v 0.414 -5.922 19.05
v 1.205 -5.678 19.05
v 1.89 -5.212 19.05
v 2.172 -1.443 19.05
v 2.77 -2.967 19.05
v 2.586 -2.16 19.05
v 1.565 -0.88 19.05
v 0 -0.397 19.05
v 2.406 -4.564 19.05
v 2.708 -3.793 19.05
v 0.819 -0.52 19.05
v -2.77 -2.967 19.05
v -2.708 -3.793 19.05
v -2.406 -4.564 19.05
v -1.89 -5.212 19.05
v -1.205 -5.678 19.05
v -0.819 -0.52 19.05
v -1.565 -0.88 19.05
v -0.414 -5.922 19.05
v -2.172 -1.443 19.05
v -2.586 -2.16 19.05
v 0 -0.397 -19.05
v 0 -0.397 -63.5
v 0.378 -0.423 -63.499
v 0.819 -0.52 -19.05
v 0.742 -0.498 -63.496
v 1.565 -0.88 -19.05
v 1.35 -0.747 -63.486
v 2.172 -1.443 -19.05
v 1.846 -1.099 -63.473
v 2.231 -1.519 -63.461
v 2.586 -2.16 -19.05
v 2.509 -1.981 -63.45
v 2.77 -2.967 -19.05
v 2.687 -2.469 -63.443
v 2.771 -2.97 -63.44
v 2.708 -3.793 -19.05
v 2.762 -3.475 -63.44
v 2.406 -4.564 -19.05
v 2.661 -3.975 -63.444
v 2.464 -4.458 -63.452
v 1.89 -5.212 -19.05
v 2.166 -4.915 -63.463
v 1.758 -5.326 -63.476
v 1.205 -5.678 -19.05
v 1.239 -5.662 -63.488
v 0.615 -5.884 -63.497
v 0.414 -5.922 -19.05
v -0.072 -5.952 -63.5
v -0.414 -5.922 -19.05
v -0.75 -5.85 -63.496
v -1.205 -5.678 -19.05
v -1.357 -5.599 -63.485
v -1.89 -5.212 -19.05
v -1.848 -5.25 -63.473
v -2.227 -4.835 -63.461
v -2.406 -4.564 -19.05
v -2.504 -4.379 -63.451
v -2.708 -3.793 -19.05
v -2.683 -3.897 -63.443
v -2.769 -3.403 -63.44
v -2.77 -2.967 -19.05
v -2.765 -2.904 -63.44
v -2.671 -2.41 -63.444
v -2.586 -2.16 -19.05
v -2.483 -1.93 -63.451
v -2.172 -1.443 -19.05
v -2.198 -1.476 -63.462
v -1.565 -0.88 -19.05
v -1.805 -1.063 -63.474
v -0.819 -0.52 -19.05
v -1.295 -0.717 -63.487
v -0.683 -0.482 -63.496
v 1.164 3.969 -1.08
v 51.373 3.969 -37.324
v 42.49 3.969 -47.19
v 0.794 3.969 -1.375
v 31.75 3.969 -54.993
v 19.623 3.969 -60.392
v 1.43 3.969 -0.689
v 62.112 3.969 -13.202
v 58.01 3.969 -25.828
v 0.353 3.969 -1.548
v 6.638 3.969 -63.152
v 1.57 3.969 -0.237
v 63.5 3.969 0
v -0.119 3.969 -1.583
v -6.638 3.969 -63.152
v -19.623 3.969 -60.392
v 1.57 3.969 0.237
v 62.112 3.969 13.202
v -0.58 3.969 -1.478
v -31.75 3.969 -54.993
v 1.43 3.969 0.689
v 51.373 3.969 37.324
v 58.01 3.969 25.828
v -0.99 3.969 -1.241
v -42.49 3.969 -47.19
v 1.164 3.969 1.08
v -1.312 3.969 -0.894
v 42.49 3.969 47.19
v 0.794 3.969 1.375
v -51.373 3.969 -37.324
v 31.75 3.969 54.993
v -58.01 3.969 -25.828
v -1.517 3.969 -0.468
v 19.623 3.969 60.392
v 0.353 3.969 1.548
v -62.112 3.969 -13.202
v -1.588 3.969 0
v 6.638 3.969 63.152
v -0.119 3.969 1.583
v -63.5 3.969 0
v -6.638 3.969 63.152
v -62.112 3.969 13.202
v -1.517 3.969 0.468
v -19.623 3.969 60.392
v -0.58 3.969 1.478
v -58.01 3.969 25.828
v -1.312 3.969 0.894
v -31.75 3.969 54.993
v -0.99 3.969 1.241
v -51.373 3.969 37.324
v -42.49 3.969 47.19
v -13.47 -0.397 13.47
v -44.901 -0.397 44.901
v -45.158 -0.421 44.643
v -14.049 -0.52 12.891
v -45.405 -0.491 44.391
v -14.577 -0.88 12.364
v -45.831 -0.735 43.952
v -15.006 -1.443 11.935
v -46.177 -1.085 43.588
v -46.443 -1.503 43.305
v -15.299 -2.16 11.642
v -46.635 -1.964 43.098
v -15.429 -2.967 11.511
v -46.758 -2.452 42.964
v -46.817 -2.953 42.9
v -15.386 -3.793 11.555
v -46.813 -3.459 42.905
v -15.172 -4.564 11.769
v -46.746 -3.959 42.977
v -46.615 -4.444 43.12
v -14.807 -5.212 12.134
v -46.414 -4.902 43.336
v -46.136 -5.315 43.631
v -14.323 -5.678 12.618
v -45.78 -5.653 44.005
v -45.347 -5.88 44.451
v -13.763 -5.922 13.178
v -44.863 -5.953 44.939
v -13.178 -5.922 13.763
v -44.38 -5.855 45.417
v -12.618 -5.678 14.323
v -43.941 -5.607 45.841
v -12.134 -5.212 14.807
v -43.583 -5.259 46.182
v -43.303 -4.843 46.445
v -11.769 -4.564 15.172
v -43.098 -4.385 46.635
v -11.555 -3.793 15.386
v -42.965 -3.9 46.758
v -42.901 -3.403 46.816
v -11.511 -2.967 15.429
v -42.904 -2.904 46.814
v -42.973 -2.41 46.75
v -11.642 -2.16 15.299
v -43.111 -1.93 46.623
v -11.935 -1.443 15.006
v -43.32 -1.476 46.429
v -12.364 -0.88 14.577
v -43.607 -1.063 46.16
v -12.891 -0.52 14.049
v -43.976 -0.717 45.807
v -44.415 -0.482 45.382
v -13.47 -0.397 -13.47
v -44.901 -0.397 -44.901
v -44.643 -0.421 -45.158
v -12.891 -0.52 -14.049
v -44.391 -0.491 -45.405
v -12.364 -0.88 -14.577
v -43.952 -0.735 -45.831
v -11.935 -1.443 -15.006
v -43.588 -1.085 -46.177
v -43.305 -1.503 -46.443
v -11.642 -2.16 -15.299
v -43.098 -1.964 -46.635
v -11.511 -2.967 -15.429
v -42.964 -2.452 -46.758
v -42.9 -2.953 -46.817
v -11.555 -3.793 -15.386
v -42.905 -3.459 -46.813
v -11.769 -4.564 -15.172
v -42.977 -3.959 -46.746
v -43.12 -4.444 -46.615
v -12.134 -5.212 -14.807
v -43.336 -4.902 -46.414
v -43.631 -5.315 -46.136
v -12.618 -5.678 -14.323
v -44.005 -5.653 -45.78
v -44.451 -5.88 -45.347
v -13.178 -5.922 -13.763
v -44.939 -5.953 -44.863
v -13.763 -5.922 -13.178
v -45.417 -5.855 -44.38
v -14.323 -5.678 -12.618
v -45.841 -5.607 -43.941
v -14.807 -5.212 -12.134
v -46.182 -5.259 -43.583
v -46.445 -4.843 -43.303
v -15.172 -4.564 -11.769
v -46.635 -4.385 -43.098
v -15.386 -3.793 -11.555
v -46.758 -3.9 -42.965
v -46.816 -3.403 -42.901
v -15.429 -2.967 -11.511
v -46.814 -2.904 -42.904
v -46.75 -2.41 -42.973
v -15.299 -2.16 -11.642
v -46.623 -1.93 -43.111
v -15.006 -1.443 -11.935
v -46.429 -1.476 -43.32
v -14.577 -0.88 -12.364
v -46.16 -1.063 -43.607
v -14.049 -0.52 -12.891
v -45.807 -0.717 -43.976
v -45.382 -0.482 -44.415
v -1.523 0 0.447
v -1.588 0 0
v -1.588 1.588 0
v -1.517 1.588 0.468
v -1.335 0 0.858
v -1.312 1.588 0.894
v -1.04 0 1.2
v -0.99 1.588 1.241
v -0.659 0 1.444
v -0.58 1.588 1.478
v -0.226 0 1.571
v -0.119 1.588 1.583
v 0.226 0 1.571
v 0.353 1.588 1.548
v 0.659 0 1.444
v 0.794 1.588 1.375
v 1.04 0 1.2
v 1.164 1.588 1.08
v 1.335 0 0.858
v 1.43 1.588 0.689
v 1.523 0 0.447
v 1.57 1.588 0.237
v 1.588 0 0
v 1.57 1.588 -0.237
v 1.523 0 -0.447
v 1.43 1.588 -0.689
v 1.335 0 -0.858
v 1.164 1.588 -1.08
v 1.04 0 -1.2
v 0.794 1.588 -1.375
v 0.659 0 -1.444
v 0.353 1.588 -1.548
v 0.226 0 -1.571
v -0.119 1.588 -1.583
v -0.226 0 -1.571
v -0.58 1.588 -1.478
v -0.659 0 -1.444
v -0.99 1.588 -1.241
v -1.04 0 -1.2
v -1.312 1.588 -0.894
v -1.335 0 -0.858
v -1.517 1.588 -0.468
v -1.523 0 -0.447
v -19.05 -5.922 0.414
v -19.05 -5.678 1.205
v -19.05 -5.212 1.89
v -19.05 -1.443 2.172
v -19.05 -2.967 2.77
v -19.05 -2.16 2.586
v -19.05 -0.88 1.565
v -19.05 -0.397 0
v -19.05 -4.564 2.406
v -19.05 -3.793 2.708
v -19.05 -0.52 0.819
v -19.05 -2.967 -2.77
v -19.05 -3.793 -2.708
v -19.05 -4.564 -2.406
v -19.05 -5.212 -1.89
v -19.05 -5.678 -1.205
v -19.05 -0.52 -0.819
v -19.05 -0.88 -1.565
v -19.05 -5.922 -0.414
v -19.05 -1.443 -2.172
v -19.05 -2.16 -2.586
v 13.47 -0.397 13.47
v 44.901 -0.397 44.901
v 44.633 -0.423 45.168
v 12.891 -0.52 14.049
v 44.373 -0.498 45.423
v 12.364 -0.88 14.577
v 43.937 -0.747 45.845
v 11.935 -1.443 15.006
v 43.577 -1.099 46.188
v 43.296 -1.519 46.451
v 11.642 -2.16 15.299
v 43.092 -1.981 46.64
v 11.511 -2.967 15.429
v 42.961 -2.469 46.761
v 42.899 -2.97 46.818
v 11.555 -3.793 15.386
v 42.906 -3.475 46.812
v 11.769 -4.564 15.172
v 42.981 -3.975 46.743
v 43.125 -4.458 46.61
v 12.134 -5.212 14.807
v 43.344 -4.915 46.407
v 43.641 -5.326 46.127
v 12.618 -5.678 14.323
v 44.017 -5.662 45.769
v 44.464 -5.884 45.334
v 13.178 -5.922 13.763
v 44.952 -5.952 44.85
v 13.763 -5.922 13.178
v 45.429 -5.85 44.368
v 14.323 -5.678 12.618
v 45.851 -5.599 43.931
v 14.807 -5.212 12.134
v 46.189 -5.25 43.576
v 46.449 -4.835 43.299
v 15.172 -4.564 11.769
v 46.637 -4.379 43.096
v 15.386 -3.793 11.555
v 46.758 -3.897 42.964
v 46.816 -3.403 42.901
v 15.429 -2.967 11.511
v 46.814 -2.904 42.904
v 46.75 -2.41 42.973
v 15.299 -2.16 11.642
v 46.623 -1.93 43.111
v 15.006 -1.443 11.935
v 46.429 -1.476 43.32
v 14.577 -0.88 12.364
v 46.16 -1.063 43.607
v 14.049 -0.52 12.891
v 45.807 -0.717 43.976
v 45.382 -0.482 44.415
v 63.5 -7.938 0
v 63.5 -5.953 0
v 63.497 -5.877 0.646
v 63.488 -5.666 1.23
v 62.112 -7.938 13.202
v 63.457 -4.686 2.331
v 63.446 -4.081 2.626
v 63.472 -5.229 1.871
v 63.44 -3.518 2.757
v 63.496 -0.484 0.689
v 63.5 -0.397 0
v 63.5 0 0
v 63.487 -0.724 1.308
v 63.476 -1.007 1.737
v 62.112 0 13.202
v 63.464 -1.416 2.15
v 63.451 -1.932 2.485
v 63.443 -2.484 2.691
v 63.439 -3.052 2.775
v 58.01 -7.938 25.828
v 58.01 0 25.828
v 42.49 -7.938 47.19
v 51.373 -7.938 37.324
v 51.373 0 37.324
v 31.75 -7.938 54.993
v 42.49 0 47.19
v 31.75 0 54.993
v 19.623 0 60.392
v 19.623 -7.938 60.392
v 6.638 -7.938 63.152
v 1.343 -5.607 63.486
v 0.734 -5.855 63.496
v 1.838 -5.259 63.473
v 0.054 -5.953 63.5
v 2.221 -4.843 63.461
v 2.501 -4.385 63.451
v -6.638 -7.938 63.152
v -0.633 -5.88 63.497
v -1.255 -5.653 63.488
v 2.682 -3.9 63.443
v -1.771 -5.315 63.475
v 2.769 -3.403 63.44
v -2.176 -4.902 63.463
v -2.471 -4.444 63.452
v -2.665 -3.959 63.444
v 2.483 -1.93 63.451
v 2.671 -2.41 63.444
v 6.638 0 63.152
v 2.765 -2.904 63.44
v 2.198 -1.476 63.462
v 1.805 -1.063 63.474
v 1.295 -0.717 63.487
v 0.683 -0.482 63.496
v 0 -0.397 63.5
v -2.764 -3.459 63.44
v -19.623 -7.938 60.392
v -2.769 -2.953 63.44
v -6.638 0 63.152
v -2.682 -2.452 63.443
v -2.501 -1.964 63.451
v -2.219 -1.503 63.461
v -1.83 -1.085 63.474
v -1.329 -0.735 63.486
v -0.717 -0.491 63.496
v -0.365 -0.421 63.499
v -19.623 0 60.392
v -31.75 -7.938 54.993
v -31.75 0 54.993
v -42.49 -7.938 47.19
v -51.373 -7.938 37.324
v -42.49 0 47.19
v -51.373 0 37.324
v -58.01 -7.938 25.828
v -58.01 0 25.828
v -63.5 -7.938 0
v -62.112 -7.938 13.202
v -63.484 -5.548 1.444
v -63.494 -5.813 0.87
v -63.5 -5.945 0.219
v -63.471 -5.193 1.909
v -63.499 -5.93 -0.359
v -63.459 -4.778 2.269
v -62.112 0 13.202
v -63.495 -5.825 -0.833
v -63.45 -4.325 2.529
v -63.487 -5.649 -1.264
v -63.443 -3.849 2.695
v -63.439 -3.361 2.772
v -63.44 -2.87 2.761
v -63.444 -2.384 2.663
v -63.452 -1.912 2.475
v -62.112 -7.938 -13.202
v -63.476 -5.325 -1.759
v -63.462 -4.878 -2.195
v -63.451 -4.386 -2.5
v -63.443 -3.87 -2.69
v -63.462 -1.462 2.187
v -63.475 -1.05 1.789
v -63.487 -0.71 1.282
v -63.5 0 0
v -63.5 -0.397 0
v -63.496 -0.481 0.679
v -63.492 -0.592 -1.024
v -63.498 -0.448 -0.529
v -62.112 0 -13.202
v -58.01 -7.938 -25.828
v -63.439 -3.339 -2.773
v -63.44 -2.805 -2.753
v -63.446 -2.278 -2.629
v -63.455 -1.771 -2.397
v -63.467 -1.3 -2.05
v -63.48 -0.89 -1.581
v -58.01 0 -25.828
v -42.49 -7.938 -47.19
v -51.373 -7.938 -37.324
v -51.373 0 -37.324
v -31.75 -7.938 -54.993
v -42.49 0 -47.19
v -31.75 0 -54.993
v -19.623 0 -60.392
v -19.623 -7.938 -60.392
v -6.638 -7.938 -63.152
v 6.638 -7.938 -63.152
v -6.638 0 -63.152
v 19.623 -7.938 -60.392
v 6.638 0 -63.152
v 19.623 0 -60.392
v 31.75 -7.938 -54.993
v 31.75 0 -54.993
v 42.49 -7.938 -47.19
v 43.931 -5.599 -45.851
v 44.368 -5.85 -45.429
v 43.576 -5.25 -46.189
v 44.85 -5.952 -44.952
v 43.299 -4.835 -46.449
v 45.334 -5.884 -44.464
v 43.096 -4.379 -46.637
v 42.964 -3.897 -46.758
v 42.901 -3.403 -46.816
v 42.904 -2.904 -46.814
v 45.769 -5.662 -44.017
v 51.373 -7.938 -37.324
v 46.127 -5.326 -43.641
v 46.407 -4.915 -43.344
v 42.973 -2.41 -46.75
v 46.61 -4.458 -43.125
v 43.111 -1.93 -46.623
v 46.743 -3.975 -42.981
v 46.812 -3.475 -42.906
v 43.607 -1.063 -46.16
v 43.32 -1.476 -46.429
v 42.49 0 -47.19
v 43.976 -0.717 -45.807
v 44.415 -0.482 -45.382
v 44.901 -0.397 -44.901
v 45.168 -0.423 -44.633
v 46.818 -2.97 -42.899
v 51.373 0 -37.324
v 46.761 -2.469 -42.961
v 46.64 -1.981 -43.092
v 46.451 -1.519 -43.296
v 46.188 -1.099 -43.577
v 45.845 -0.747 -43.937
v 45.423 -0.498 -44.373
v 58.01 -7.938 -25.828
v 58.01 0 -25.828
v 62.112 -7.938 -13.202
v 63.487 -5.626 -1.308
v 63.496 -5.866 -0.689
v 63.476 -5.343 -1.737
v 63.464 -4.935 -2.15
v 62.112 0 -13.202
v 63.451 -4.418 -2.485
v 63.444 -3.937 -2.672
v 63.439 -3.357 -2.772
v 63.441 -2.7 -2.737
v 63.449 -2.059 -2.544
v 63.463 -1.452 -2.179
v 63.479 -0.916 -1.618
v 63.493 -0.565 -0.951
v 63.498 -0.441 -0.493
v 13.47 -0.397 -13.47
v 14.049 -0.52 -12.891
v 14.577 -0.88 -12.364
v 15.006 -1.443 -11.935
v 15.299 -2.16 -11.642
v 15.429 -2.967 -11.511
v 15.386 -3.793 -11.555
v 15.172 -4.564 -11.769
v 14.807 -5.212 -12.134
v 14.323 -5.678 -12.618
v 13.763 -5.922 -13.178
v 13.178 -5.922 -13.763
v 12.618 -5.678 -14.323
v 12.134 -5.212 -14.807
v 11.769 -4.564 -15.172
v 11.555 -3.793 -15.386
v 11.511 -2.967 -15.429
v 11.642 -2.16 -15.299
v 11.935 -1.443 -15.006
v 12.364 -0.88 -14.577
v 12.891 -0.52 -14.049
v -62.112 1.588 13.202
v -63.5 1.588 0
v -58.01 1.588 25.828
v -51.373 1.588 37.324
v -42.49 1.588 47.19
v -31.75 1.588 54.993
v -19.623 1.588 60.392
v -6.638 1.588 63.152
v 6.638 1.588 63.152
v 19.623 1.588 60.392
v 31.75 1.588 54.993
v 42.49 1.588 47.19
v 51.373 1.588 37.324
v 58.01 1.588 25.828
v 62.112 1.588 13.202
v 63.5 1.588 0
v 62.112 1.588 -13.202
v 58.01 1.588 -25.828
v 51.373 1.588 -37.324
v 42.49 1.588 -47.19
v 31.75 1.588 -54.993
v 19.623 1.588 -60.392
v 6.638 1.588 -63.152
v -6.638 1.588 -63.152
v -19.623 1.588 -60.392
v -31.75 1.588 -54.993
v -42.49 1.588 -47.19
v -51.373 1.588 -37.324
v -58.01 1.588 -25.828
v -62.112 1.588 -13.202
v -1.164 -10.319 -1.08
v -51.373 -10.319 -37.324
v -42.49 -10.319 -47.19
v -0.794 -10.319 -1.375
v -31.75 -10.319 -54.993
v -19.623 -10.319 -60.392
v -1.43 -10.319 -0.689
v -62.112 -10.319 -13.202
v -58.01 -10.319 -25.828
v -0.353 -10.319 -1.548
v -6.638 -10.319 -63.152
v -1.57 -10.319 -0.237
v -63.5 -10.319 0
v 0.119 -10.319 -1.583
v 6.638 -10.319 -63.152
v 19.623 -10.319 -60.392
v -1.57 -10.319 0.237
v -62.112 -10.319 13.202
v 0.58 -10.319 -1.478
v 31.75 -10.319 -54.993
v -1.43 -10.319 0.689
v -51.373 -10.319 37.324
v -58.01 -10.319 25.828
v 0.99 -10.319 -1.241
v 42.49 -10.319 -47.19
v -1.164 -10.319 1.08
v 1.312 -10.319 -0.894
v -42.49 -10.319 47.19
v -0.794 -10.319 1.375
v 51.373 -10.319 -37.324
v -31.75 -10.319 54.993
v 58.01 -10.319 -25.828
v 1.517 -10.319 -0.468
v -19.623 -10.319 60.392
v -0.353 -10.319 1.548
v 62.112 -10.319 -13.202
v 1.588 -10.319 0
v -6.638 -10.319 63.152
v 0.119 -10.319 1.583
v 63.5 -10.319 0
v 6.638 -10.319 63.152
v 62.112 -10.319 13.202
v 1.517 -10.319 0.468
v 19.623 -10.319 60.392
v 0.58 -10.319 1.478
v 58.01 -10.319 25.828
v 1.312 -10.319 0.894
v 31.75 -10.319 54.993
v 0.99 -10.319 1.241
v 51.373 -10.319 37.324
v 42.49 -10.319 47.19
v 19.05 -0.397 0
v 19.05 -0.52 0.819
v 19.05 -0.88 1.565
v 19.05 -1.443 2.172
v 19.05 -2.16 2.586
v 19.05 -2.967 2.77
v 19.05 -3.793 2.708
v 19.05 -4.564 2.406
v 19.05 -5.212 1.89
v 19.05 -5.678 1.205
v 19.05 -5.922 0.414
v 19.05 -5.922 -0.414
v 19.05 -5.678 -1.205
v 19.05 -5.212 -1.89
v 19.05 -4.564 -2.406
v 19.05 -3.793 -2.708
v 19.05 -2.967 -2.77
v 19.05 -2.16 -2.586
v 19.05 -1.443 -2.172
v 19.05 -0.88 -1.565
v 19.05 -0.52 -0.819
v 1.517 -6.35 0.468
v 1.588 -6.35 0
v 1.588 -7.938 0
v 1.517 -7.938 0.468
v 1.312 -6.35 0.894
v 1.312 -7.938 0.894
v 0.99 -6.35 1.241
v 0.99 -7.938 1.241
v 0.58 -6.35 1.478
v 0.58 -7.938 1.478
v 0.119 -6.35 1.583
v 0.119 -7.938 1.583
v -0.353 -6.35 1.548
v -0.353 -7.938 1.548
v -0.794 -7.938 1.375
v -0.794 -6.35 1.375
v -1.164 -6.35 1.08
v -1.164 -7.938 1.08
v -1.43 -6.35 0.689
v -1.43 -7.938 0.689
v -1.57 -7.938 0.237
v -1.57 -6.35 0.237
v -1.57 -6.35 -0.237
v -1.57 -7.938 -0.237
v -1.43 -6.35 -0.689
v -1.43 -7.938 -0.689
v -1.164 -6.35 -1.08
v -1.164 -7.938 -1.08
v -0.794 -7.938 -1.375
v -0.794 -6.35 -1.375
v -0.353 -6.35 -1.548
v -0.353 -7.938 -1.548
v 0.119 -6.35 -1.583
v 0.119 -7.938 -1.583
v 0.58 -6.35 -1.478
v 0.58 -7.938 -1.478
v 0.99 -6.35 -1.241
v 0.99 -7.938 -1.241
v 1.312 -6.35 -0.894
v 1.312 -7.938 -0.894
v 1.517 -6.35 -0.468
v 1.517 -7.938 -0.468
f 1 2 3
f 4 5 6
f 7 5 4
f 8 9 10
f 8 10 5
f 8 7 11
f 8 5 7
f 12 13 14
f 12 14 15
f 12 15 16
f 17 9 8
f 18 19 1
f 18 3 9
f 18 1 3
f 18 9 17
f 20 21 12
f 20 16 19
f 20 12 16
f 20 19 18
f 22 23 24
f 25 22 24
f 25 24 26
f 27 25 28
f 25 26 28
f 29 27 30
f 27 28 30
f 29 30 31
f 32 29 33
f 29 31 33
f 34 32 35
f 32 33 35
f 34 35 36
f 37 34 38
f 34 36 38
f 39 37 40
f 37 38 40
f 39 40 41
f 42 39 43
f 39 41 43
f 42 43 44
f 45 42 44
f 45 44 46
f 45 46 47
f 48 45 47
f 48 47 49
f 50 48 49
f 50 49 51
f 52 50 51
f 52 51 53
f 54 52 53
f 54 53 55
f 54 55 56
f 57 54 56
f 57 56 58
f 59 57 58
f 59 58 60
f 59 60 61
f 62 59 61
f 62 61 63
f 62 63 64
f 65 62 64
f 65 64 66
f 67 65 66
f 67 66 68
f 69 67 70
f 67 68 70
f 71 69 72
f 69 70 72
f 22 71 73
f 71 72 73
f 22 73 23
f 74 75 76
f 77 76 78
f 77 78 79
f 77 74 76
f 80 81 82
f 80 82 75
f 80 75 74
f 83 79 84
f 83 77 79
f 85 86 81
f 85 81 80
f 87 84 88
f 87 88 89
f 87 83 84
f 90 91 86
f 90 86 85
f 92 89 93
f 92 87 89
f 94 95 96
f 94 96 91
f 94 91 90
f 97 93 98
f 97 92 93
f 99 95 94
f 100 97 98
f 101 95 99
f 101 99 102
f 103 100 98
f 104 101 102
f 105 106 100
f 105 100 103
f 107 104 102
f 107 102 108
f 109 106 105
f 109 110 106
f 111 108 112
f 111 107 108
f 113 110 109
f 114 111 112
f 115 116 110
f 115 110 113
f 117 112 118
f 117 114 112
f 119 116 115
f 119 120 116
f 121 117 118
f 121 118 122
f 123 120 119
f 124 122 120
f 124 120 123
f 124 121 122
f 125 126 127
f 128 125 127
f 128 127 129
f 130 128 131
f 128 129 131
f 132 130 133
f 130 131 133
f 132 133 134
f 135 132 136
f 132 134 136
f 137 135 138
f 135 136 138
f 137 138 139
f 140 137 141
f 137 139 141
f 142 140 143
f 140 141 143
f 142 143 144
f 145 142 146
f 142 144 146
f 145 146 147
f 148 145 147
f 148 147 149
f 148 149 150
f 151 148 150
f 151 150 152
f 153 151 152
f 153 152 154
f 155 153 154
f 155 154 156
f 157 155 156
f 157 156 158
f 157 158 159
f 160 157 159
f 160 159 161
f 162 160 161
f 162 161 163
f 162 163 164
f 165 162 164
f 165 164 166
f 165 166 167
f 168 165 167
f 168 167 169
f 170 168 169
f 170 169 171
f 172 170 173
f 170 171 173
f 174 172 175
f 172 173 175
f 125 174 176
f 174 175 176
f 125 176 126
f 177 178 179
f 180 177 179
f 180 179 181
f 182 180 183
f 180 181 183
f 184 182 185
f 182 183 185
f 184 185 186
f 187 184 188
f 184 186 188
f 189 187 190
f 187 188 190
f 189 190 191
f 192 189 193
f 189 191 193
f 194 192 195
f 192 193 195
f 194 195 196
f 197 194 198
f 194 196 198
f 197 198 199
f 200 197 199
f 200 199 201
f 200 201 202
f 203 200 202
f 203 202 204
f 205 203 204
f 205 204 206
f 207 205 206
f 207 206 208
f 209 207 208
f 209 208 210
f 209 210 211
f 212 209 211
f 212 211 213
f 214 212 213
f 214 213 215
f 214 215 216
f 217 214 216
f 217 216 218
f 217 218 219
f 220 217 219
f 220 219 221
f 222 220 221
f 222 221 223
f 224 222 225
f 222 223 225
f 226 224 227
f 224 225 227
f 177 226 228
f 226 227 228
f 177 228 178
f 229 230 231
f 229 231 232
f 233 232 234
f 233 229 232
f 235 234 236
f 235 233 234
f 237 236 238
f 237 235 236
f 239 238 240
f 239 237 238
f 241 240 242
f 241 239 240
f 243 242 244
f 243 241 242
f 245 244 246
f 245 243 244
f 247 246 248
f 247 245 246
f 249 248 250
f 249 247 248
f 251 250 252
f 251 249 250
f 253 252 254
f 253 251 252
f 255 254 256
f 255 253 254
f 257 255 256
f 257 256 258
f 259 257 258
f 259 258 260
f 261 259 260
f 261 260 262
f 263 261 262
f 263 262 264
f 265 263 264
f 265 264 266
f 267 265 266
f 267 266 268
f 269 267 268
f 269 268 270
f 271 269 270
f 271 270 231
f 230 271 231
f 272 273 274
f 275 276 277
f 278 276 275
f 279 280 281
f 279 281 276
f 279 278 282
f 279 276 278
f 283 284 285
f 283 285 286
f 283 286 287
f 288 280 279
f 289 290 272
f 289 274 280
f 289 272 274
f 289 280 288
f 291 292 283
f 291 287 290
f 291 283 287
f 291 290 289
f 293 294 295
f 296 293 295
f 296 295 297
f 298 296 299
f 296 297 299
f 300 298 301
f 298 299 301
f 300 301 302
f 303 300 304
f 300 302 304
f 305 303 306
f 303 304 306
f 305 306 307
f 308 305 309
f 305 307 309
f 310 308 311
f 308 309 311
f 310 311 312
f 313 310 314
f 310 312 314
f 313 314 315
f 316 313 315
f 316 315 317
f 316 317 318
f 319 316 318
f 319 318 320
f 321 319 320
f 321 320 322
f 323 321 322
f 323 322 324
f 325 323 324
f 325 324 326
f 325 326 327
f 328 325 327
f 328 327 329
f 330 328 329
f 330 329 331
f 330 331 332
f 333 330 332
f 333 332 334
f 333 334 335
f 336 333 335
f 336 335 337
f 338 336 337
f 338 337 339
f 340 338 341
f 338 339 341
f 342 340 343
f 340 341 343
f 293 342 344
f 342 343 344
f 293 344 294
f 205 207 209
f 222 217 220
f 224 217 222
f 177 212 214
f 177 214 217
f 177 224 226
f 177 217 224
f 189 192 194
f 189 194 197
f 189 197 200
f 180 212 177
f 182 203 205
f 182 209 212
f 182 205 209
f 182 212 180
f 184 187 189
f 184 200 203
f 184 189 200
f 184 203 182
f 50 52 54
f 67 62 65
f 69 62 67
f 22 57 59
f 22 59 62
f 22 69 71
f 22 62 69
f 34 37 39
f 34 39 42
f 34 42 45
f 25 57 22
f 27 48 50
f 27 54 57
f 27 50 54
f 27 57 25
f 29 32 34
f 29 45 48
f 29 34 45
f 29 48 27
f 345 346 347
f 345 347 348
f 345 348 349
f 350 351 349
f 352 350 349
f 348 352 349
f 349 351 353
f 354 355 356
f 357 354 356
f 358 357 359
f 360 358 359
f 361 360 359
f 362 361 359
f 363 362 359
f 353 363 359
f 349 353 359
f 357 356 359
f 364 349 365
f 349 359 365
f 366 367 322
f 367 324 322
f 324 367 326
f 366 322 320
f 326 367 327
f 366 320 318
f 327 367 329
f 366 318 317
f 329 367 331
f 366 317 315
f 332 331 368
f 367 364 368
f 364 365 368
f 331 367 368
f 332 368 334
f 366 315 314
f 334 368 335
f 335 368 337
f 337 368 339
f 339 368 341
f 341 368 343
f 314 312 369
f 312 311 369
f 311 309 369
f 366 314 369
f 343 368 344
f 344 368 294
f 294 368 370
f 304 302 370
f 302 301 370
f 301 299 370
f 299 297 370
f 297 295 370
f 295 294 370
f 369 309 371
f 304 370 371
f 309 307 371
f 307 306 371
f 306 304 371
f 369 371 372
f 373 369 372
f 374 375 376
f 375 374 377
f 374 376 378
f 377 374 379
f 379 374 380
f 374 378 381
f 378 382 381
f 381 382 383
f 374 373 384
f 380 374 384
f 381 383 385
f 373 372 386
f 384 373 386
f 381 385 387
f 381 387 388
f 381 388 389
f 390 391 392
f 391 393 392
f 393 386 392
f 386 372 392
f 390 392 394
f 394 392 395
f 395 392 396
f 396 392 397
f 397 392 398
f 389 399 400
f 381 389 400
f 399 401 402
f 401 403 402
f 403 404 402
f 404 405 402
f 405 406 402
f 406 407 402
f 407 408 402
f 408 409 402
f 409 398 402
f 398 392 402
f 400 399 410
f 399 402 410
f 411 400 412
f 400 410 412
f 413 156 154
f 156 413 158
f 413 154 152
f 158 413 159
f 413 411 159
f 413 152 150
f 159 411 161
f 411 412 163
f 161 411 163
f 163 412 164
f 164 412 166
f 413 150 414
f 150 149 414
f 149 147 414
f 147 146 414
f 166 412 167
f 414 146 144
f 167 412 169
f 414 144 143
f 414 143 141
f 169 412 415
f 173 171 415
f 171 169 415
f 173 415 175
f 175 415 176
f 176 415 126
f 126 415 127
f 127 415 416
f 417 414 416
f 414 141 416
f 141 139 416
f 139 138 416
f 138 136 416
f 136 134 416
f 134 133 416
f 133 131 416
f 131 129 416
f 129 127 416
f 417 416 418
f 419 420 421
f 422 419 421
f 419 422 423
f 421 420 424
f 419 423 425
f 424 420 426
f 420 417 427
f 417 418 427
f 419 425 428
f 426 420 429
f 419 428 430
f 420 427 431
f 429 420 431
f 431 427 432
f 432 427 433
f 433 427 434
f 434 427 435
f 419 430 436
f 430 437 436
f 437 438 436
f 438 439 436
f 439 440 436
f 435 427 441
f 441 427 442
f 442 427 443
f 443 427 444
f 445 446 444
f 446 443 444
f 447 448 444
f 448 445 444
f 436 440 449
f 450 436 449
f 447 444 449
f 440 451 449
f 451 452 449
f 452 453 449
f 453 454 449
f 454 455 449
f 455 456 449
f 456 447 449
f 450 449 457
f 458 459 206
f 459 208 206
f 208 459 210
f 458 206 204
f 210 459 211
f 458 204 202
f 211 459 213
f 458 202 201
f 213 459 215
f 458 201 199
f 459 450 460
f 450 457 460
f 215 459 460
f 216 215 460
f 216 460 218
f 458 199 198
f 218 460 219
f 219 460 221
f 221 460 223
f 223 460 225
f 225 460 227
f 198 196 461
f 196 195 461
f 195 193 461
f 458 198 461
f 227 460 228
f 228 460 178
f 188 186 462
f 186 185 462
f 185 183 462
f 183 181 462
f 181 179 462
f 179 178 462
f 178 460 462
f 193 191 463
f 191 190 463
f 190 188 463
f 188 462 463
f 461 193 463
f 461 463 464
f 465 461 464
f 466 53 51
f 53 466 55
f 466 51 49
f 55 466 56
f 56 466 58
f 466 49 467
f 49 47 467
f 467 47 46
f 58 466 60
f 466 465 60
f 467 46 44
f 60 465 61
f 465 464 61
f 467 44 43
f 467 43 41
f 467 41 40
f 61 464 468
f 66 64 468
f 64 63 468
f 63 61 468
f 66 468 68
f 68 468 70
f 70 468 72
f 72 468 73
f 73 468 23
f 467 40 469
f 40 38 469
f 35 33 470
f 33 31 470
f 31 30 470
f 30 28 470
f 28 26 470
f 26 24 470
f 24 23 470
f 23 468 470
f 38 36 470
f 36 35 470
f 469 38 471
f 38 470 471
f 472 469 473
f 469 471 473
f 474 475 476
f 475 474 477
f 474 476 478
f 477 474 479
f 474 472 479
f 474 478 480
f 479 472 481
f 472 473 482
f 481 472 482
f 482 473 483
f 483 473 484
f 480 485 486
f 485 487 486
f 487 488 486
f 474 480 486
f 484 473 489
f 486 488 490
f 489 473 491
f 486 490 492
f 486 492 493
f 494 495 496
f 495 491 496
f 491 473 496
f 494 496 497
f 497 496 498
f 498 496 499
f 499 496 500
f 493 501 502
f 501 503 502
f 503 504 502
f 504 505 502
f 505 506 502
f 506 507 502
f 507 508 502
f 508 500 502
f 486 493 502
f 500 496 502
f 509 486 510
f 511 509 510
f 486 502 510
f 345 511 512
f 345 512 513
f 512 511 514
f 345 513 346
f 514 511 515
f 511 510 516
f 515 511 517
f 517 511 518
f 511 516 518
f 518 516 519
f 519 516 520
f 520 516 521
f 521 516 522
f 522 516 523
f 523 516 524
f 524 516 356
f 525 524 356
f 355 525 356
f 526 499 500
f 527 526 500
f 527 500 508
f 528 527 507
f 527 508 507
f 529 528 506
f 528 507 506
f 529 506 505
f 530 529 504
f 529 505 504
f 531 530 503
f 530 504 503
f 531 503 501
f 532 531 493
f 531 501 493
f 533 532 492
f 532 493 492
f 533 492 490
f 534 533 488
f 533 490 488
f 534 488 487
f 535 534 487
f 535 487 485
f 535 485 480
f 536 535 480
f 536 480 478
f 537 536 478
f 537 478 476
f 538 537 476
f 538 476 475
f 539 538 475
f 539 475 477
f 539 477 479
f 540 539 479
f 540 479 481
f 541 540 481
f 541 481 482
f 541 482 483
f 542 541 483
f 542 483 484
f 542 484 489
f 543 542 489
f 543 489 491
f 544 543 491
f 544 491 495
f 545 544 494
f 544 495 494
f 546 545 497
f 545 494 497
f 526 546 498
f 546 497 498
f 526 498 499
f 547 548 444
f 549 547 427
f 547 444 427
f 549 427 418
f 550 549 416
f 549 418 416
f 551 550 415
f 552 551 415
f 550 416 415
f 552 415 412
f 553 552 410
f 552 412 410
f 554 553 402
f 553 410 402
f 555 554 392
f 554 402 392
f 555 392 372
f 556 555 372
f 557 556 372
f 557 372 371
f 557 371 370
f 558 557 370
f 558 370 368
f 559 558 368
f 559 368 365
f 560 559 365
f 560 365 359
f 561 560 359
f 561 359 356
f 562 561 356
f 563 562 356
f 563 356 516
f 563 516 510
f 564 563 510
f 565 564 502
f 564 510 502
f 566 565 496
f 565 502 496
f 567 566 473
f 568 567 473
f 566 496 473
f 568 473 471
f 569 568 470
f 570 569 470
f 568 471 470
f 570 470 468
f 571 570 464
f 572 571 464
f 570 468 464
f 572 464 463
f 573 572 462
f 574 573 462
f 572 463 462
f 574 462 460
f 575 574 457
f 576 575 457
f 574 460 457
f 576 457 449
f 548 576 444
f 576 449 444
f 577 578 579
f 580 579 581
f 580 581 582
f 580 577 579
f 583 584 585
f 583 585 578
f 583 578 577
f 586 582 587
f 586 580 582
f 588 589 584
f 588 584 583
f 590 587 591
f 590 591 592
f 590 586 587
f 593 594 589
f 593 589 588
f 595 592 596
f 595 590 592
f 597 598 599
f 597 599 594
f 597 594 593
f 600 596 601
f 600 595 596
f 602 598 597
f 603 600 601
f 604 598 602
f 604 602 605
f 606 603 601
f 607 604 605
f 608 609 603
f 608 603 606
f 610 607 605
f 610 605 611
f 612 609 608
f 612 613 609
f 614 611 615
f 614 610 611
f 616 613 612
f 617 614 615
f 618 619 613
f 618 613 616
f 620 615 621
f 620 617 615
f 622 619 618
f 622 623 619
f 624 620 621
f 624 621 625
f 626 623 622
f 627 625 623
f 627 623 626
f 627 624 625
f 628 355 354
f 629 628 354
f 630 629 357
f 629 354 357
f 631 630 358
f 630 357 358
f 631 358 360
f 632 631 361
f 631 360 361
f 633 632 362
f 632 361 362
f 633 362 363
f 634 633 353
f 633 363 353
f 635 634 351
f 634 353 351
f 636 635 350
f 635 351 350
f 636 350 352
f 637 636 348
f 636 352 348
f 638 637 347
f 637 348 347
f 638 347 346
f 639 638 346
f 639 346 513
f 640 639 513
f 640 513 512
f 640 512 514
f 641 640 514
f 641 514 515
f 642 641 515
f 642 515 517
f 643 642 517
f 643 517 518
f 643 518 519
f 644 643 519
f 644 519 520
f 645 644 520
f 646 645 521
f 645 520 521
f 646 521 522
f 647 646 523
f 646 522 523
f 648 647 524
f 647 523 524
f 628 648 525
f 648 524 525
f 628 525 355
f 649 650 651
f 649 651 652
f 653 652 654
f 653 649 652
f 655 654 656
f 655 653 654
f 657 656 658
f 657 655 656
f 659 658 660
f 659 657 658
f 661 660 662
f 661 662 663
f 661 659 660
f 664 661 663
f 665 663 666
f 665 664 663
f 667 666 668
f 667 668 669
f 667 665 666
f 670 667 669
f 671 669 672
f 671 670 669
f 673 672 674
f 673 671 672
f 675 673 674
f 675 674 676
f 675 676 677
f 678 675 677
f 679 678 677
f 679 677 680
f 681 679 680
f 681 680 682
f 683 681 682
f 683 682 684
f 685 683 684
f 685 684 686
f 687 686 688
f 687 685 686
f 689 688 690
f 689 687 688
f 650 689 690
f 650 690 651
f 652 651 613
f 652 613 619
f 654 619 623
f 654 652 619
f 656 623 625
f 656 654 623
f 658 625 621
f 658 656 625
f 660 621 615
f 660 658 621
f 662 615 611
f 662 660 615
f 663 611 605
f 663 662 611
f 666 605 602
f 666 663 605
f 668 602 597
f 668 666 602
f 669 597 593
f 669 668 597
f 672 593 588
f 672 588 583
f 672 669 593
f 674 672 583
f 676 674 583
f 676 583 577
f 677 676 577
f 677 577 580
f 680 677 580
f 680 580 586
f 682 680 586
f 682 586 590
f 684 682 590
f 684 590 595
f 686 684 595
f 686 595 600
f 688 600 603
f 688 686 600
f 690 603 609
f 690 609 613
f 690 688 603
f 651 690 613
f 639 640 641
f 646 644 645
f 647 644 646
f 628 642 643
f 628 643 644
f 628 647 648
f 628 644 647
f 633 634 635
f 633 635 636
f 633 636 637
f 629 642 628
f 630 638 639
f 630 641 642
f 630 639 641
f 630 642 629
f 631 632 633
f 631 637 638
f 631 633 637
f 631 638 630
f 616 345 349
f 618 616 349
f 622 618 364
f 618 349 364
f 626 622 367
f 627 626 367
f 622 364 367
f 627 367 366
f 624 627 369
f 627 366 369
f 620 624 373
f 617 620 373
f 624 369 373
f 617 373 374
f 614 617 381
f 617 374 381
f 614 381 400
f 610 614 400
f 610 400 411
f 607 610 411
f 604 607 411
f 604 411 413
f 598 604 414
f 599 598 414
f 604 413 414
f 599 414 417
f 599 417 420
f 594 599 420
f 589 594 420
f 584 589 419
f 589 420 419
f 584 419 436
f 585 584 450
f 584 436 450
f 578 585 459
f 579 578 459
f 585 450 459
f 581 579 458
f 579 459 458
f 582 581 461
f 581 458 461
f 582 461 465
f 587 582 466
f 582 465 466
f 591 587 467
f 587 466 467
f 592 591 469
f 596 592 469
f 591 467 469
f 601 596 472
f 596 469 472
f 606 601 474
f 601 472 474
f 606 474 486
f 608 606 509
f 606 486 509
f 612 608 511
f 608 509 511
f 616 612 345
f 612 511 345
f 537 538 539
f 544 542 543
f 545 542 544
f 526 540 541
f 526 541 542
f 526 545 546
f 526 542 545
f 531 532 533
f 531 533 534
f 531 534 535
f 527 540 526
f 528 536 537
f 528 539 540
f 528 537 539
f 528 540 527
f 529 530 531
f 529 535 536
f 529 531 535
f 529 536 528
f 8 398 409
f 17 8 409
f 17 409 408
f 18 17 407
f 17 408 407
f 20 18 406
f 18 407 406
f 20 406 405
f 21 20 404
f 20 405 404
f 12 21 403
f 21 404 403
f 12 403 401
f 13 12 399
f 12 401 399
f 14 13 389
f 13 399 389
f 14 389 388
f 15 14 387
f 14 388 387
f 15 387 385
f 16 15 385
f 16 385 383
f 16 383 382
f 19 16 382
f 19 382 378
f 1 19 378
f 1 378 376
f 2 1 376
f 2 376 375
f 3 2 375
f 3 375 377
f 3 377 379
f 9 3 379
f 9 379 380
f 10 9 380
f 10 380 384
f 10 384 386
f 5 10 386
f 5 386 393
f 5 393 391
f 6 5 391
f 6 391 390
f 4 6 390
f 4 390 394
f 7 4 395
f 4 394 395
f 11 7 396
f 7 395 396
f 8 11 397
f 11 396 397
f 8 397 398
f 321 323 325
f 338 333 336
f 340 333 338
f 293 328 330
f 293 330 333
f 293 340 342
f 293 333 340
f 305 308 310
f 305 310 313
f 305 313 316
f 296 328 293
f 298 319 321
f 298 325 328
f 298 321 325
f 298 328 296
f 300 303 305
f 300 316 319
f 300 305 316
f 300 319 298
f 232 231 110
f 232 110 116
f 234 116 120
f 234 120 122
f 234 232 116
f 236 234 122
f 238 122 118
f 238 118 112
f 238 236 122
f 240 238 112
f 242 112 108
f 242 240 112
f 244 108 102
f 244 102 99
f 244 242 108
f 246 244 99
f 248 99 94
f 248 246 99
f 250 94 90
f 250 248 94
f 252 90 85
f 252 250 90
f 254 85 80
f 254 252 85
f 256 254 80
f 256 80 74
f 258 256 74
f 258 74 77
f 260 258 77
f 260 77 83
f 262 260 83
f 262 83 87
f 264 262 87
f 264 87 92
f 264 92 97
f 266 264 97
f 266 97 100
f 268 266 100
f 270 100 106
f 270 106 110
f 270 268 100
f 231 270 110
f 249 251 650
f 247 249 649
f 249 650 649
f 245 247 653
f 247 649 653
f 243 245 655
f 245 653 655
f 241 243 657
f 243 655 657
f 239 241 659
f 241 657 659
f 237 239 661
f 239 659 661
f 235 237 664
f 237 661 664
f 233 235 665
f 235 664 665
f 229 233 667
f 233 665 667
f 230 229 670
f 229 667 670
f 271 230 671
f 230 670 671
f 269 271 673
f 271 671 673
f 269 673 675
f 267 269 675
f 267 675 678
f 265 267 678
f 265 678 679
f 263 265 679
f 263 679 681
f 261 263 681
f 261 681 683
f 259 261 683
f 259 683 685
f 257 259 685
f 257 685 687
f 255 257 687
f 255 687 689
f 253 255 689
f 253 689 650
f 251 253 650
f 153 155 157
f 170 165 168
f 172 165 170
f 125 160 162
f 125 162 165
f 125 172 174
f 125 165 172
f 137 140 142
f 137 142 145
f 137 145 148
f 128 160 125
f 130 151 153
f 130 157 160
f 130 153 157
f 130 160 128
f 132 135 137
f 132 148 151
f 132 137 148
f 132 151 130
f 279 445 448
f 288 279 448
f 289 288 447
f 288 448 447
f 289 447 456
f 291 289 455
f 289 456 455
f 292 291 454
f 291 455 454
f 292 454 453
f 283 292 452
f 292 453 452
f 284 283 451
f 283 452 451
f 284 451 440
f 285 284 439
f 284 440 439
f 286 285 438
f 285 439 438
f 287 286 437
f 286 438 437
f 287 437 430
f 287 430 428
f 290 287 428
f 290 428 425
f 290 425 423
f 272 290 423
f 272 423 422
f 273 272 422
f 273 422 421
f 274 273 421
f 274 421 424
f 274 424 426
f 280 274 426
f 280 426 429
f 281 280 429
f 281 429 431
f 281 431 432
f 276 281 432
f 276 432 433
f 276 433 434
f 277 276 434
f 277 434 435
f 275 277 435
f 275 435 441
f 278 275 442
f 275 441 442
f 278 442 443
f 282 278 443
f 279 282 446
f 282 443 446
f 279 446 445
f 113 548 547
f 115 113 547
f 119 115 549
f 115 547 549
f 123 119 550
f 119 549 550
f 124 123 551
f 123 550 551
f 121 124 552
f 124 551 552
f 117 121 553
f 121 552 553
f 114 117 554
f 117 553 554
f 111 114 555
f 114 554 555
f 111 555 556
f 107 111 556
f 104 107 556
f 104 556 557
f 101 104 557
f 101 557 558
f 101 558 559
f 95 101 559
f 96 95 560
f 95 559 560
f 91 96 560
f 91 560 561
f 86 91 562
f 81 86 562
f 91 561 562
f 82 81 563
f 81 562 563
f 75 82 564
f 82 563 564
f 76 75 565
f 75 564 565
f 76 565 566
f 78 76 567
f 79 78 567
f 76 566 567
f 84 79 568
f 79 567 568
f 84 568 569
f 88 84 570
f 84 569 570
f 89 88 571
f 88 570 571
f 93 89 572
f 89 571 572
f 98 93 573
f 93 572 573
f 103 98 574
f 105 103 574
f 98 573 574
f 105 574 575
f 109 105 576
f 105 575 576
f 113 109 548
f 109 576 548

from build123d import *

# Parameters (mm, degrees)
F0_R      = 63.5
F1_DEPTH  = 6.35
F2_R      = 1.5875
F3_DEPTH  = 6.351
F6_R      = 2.778125
F7_DEPTH  = 44.45
F8_COUNT  = 8
F10_DEPTH = 1.5875
F4_R      = 63.5
F4_R_2    = 1.5875
F11_DEPTH = 1.5875
F12_DEPTH = 2.38125
F13_DEPTH = 2.38125


with BuildPart() as f1:
    # F0 (on Front) → F1 (new body)
    with BuildSketch(Plane.XZ):
        Circle(F0_R)
    extrude(amount=F1_DEPTH)

    # F2 (on face) → F3 (cut, through all)
    with BuildSketch(Plane.XZ.offset(6.35)):
        Circle(F2_R)
    extrude(amount=-F3_DEPTH, mode=Mode.SUBTRACT)


with BuildPart() as f7:
    # F6 (on line) → F7 (new body)
    with BuildSketch(Plane.YZ.offset(63.5)):
        with Locations((-3.175, 0)):
            Circle(F6_R)
    extrude(amount=-F7_DEPTH)


with BuildPart() as f8_1:
    # F8: instance of F7
    add(f7.part.rotate(Axis((0, -6.35, 0), (0, -1, 0)), 1 * 360 / F8_COUNT))


with BuildPart() as f8_2:
    # F8: instance of F7
    add(f7.part.rotate(Axis((0, -6.35, 0), (0, -1, 0)), 2 * 360 / F8_COUNT))


with BuildPart() as f8_3:
    # F8: instance of F7
    add(f7.part.rotate(Axis((0, -6.35, 0), (0, -1, 0)), 3 * 360 / F8_COUNT))


with BuildPart() as f8_4:
    # F8: instance of F7
    add(f7.part.rotate(Axis((0, -6.35, 0), (0, -1, 0)), 4 * 360 / F8_COUNT))


with BuildPart() as f8_5:
    # F8: instance of F7
    add(f7.part.rotate(Axis((0, -6.35, 0), (0, -1, 0)), 5 * 360 / F8_COUNT))


with BuildPart() as f8_6:
    # F8: instance of F7
    add(f7.part.rotate(Axis((0, -6.35, 0), (0, -1, 0)), 6 * 360 / F8_COUNT))


with BuildPart() as f8_7:
    # F8: instance of F7
    add(f7.part.rotate(Axis((0, -6.35, 0), (0, -1, 0)), 7 * 360 / F8_COUNT))


with BuildPart() as f1_1:
    add(f1.part)

    # F9: cut F8_1, F7, F8_7, F8_2, F8_3, F8_4, F8_5, F8_6
    add(f8_1.part, mode=Mode.SUBTRACT)
    add(f7.part, mode=Mode.SUBTRACT)
    add(f8_7.part, mode=Mode.SUBTRACT)
    add(f8_2.part, mode=Mode.SUBTRACT)
    add(f8_3.part, mode=Mode.SUBTRACT)
    add(f8_4.part, mode=Mode.SUBTRACT)
    add(f8_5.part, mode=Mode.SUBTRACT)
    add(f8_6.part, mode=Mode.SUBTRACT)

    # F10 (add): a face of the model
    f10_faces = [f1_1.faces().sort_by_distance(p)[0] for p in [
        (-61.7039487758, -6.35, 0),
    ]]
    extrude(f10_faces, amount=F10_DEPTH)

    # F4 (on face) → F11 (join)
    with BuildSketch(Plane(origin=(0, 0, 0), x_dir=(-1, 0, 0), z_dir=(0, 1, 0))):
        Circle(F4_R)
        Circle(F4_R_2, mode=Mode.SUBTRACT)
    extrude(amount=F11_DEPTH)

    # F12 (add): a face of the model
    f12_faces = [f1_1.faces().sort_by_distance(p)[0] for p in [
        (-61.7039487758, -7.9375, 0),
    ]]
    extrude(f12_faces, amount=F12_DEPTH)

    # F13 (add): a face of the model
    f13_faces = [f1_1.faces().sort_by_distance(p)[0] for p in [
        (61.7039487758, 1.5875, 0),
    ]]
    extrude(f13_faces, amount=F13_DEPTH)


solid = f1_1.part
